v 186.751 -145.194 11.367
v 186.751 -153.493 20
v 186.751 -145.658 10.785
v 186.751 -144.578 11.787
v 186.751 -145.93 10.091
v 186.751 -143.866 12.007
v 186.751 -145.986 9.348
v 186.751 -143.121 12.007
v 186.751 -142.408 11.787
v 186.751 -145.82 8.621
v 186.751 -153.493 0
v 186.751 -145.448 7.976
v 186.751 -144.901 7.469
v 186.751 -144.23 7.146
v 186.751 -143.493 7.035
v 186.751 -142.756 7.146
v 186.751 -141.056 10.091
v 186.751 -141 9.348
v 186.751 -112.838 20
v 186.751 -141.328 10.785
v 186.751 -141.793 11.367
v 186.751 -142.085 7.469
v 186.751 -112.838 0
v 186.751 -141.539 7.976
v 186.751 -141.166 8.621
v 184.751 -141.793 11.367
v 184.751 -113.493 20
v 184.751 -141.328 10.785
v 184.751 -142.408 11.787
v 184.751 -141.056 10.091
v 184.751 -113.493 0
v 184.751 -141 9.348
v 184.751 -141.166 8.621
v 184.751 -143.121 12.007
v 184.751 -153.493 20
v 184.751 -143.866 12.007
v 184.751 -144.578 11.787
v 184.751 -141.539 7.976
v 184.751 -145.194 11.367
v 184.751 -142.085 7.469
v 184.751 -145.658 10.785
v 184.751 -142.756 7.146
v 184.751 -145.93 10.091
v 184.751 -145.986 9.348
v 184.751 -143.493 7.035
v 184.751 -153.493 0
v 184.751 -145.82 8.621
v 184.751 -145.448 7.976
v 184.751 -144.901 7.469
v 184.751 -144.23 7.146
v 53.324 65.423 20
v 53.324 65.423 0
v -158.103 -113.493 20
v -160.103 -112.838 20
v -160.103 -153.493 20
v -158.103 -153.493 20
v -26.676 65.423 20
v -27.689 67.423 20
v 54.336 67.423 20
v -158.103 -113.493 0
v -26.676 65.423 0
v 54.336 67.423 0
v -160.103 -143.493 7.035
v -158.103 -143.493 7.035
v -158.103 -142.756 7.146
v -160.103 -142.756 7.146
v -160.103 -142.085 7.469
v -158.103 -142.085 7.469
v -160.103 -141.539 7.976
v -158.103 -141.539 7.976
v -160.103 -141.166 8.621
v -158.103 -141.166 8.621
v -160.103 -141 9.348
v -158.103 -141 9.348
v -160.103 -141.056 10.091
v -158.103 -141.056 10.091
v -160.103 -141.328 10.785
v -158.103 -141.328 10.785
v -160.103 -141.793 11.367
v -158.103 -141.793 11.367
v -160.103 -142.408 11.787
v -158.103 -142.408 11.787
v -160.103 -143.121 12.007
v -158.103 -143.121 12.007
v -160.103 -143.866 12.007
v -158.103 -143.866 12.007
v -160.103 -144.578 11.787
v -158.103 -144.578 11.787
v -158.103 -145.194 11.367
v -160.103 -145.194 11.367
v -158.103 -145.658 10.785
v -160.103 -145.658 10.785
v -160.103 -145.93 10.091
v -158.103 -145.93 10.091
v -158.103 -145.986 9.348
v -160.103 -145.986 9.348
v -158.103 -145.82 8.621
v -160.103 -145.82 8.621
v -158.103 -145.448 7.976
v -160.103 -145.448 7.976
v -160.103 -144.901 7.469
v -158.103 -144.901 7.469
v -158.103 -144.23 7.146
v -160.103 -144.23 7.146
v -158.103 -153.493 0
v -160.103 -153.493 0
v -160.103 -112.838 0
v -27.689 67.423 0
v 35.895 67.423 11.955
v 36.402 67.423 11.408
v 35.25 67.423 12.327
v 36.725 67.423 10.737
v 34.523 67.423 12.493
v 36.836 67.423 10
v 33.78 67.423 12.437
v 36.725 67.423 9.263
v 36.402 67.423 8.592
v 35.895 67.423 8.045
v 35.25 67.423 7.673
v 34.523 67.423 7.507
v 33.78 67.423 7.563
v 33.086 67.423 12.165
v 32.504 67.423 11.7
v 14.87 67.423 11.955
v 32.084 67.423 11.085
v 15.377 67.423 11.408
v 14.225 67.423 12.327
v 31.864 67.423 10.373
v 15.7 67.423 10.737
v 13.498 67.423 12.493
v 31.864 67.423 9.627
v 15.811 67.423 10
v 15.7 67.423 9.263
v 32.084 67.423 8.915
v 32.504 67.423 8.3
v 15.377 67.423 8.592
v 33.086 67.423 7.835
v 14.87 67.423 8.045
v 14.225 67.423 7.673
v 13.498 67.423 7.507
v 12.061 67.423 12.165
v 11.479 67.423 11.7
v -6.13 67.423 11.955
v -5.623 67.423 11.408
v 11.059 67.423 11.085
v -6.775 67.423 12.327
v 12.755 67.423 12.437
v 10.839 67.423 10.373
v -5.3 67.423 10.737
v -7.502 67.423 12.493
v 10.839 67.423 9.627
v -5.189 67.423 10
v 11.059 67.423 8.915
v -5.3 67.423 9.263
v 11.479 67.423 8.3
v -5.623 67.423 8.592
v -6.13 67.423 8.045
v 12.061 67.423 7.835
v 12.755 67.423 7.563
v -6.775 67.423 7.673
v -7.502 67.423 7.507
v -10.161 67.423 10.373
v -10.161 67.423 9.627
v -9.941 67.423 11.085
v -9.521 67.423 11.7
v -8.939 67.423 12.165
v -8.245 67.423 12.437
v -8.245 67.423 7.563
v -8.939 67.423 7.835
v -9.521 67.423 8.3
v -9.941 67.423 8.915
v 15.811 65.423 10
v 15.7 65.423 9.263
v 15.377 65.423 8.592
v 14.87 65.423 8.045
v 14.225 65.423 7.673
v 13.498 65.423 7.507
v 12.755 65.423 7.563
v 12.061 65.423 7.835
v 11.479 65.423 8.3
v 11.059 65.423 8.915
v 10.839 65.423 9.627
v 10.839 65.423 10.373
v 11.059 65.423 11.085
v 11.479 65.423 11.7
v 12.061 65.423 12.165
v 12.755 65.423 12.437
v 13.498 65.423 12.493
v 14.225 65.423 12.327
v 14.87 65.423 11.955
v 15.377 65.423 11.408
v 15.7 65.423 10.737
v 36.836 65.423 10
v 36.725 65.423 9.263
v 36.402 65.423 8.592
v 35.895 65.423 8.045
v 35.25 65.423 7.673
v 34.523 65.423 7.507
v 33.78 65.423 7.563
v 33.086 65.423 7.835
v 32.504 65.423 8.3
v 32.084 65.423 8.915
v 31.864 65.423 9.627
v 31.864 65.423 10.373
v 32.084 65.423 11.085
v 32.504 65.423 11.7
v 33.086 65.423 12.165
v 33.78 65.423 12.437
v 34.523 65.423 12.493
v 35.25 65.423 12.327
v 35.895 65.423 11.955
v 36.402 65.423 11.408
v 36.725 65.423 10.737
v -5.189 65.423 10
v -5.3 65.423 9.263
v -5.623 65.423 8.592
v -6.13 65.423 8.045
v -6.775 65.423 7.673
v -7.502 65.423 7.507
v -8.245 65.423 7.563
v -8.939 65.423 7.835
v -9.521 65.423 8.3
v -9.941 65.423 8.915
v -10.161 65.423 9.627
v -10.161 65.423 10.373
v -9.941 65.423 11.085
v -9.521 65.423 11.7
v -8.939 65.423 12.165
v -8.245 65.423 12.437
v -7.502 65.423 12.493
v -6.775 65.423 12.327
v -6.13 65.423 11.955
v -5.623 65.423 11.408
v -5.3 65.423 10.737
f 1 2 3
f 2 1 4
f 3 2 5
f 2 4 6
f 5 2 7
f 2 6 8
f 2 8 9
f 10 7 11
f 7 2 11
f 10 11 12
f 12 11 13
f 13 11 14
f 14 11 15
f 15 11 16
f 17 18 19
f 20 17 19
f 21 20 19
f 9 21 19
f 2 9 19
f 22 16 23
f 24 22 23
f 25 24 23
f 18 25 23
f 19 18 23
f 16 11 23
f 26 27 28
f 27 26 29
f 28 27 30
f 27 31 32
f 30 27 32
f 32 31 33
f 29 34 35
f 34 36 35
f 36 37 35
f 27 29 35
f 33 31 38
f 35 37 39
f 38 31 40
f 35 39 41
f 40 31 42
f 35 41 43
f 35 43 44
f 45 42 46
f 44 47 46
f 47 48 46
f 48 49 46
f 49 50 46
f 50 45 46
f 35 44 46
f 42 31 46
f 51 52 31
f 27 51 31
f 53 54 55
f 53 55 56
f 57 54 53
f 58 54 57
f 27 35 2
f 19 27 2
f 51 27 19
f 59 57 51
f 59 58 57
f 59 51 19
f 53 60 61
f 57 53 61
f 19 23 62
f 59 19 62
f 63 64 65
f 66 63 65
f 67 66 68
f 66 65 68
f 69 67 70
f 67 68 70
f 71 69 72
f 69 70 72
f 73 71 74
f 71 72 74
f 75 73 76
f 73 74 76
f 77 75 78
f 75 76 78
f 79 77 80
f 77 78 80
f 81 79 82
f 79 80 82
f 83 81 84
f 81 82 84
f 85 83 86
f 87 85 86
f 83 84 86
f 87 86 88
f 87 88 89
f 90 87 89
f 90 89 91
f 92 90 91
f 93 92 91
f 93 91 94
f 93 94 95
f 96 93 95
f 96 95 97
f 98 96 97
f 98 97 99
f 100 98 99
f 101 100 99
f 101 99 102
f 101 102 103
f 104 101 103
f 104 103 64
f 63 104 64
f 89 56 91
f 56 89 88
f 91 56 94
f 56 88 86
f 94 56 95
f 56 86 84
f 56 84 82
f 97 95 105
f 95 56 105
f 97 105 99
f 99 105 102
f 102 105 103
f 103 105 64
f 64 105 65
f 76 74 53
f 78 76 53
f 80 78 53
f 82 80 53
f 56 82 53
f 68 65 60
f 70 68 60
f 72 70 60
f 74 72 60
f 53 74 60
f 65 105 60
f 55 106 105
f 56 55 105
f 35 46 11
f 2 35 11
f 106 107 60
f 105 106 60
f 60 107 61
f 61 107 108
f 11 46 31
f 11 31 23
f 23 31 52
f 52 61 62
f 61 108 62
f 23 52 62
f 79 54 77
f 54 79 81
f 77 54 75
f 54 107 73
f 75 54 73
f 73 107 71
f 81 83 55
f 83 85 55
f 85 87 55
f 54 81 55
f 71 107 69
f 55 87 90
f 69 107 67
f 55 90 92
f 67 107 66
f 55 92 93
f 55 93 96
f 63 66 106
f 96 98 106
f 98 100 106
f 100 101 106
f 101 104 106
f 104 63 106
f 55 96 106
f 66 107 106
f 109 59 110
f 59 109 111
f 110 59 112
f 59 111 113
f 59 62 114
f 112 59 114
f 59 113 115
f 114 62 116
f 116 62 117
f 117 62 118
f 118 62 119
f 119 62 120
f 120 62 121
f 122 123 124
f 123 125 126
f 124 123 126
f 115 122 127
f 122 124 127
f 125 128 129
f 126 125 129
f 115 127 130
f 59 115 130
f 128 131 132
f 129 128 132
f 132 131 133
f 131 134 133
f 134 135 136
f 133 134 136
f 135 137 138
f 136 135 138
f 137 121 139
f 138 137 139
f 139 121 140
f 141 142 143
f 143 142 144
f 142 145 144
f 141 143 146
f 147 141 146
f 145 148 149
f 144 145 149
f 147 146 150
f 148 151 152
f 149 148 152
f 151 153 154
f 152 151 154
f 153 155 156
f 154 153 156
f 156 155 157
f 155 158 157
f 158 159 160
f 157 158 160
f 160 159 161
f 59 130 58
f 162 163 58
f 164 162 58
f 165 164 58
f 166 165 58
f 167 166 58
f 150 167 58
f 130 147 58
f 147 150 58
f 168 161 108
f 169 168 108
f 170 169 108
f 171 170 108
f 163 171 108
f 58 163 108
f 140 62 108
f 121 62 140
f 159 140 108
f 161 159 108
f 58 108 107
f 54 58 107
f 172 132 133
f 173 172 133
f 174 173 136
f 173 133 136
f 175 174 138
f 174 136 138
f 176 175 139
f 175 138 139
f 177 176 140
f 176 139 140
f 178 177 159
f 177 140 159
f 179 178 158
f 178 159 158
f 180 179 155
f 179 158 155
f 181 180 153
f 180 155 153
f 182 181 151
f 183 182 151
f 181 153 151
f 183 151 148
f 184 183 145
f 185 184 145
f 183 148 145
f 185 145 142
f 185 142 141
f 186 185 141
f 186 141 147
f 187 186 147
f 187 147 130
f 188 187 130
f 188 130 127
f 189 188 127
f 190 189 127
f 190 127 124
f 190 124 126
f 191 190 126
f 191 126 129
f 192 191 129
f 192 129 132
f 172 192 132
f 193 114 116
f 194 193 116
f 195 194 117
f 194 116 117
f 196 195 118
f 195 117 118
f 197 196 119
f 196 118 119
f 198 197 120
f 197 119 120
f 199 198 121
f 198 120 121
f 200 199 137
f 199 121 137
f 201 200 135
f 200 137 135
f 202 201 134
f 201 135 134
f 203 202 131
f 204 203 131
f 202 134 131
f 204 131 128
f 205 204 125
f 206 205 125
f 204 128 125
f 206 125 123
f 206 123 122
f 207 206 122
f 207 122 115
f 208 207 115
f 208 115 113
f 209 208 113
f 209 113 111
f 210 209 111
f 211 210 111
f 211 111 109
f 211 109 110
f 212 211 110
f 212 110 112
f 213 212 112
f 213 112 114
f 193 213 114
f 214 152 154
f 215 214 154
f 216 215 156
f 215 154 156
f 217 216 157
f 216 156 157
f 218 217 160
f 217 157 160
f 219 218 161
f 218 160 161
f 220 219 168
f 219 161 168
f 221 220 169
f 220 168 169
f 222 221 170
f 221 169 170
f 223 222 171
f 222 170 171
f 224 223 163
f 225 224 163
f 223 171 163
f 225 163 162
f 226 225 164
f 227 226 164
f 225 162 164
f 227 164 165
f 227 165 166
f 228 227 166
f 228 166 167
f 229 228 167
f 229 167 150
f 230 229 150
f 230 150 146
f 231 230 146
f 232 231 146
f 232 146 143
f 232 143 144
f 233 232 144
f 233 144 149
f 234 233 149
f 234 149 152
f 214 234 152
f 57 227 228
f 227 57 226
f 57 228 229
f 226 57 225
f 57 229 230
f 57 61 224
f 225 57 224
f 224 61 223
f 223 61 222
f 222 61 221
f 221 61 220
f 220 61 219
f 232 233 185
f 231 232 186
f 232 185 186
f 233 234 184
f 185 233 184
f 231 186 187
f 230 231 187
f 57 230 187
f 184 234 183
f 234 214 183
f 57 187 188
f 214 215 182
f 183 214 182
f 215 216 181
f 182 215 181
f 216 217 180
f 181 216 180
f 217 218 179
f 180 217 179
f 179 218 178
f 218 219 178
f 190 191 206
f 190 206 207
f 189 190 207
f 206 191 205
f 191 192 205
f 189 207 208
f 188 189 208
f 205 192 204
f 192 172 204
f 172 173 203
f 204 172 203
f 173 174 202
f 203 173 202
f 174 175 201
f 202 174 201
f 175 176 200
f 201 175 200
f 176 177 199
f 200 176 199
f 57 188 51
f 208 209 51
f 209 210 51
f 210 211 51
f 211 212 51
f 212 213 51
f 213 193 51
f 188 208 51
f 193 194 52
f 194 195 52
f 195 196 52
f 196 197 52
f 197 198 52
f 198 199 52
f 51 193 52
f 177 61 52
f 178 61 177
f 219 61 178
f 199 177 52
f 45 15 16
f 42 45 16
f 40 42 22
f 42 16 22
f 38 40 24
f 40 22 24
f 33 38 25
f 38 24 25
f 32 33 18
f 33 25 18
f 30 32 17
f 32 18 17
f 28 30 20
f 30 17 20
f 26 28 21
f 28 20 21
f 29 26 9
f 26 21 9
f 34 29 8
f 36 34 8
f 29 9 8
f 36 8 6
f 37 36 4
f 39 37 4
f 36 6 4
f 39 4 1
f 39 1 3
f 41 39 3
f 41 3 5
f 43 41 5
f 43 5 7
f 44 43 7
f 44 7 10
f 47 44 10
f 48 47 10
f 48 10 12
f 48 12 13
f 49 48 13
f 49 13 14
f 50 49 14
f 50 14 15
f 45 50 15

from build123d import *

# Parameters (mm, degrees)
BOSS_EXTRUDE1_DEPTH     = 20
CUT_EXTRUDE1_DEPTH      = 90
CUT_EXTRUDE1_DEPTH_BACK = 479
SKETCH10_R              = 2.5
CUT_EXTRUDE2_DEPTH      = 47
CUT_EXTRUDE2_DEPTH_BACK = 47
SKETCH11_R              = 2.5


with BuildPart() as part:
    # Sketch9 → Boss-Extrude1 (new body)
    with BuildSketch(Plane.XY):
        Polygon((-158.103055268, -153.493142729), (-158.103055268, -113.493142729), (-26.676129575, 65.42293593), (53.323870425, 65.42293593), (184.750796118, -113.493142729), (184.750796118, -153.493142729), (186.750796118, -153.493142729), (186.750796118, -112.83750963), (54.33633476, 67.42293593), (-27.68859391, 67.42293593), (-160.103055268, -112.83750963), (-160.103055268, -153.493142729), align=None)
    extrude(amount=BOSS_EXTRUDE1_DEPTH)

    # Sketch10 → Cut-Extrude1 (cut, two sides: drawn at the far end of the back side and taken through both)
    with BuildSketch(Plane(origin=(186.750796118, 0, 0), x_dir=(0, 0, -1), z_dir=(1, 0, 0)).offset(-CUT_EXTRUDE1_DEPTH_BACK)):
        with Locations((-9.534610309, -143.493142729)):
            Circle(SKETCH10_R)
    extrude(amount=CUT_EXTRUDE1_DEPTH + CUT_EXTRUDE1_DEPTH_BACK, mode=Mode.SUBTRACT)

    # Sketch11 → Cut-Extrude2 (cut, two sides: drawn at the far end of the back side and taken through both)
    with BuildSketch(Plane(origin=(0, 67.42293593, 0), x_dir=(1, 0, 0), z_dir=(0, 1, 0)).offset(-CUT_EXTRUDE2_DEPTH_BACK)):
        with Locations((-7.68859391, -10)):
            Circle(SKETCH11_R)
        with Locations((34.33633476, -10)):
            Circle(SKETCH11_R)
        with Locations((13.31140609, -9.999992232)):
            Circle(SKETCH11_R)
    extrude(amount=CUT_EXTRUDE2_DEPTH + CUT_EXTRUDE2_DEPTH_BACK, mode=Mode.SUBTRACT)


solid = part.part
